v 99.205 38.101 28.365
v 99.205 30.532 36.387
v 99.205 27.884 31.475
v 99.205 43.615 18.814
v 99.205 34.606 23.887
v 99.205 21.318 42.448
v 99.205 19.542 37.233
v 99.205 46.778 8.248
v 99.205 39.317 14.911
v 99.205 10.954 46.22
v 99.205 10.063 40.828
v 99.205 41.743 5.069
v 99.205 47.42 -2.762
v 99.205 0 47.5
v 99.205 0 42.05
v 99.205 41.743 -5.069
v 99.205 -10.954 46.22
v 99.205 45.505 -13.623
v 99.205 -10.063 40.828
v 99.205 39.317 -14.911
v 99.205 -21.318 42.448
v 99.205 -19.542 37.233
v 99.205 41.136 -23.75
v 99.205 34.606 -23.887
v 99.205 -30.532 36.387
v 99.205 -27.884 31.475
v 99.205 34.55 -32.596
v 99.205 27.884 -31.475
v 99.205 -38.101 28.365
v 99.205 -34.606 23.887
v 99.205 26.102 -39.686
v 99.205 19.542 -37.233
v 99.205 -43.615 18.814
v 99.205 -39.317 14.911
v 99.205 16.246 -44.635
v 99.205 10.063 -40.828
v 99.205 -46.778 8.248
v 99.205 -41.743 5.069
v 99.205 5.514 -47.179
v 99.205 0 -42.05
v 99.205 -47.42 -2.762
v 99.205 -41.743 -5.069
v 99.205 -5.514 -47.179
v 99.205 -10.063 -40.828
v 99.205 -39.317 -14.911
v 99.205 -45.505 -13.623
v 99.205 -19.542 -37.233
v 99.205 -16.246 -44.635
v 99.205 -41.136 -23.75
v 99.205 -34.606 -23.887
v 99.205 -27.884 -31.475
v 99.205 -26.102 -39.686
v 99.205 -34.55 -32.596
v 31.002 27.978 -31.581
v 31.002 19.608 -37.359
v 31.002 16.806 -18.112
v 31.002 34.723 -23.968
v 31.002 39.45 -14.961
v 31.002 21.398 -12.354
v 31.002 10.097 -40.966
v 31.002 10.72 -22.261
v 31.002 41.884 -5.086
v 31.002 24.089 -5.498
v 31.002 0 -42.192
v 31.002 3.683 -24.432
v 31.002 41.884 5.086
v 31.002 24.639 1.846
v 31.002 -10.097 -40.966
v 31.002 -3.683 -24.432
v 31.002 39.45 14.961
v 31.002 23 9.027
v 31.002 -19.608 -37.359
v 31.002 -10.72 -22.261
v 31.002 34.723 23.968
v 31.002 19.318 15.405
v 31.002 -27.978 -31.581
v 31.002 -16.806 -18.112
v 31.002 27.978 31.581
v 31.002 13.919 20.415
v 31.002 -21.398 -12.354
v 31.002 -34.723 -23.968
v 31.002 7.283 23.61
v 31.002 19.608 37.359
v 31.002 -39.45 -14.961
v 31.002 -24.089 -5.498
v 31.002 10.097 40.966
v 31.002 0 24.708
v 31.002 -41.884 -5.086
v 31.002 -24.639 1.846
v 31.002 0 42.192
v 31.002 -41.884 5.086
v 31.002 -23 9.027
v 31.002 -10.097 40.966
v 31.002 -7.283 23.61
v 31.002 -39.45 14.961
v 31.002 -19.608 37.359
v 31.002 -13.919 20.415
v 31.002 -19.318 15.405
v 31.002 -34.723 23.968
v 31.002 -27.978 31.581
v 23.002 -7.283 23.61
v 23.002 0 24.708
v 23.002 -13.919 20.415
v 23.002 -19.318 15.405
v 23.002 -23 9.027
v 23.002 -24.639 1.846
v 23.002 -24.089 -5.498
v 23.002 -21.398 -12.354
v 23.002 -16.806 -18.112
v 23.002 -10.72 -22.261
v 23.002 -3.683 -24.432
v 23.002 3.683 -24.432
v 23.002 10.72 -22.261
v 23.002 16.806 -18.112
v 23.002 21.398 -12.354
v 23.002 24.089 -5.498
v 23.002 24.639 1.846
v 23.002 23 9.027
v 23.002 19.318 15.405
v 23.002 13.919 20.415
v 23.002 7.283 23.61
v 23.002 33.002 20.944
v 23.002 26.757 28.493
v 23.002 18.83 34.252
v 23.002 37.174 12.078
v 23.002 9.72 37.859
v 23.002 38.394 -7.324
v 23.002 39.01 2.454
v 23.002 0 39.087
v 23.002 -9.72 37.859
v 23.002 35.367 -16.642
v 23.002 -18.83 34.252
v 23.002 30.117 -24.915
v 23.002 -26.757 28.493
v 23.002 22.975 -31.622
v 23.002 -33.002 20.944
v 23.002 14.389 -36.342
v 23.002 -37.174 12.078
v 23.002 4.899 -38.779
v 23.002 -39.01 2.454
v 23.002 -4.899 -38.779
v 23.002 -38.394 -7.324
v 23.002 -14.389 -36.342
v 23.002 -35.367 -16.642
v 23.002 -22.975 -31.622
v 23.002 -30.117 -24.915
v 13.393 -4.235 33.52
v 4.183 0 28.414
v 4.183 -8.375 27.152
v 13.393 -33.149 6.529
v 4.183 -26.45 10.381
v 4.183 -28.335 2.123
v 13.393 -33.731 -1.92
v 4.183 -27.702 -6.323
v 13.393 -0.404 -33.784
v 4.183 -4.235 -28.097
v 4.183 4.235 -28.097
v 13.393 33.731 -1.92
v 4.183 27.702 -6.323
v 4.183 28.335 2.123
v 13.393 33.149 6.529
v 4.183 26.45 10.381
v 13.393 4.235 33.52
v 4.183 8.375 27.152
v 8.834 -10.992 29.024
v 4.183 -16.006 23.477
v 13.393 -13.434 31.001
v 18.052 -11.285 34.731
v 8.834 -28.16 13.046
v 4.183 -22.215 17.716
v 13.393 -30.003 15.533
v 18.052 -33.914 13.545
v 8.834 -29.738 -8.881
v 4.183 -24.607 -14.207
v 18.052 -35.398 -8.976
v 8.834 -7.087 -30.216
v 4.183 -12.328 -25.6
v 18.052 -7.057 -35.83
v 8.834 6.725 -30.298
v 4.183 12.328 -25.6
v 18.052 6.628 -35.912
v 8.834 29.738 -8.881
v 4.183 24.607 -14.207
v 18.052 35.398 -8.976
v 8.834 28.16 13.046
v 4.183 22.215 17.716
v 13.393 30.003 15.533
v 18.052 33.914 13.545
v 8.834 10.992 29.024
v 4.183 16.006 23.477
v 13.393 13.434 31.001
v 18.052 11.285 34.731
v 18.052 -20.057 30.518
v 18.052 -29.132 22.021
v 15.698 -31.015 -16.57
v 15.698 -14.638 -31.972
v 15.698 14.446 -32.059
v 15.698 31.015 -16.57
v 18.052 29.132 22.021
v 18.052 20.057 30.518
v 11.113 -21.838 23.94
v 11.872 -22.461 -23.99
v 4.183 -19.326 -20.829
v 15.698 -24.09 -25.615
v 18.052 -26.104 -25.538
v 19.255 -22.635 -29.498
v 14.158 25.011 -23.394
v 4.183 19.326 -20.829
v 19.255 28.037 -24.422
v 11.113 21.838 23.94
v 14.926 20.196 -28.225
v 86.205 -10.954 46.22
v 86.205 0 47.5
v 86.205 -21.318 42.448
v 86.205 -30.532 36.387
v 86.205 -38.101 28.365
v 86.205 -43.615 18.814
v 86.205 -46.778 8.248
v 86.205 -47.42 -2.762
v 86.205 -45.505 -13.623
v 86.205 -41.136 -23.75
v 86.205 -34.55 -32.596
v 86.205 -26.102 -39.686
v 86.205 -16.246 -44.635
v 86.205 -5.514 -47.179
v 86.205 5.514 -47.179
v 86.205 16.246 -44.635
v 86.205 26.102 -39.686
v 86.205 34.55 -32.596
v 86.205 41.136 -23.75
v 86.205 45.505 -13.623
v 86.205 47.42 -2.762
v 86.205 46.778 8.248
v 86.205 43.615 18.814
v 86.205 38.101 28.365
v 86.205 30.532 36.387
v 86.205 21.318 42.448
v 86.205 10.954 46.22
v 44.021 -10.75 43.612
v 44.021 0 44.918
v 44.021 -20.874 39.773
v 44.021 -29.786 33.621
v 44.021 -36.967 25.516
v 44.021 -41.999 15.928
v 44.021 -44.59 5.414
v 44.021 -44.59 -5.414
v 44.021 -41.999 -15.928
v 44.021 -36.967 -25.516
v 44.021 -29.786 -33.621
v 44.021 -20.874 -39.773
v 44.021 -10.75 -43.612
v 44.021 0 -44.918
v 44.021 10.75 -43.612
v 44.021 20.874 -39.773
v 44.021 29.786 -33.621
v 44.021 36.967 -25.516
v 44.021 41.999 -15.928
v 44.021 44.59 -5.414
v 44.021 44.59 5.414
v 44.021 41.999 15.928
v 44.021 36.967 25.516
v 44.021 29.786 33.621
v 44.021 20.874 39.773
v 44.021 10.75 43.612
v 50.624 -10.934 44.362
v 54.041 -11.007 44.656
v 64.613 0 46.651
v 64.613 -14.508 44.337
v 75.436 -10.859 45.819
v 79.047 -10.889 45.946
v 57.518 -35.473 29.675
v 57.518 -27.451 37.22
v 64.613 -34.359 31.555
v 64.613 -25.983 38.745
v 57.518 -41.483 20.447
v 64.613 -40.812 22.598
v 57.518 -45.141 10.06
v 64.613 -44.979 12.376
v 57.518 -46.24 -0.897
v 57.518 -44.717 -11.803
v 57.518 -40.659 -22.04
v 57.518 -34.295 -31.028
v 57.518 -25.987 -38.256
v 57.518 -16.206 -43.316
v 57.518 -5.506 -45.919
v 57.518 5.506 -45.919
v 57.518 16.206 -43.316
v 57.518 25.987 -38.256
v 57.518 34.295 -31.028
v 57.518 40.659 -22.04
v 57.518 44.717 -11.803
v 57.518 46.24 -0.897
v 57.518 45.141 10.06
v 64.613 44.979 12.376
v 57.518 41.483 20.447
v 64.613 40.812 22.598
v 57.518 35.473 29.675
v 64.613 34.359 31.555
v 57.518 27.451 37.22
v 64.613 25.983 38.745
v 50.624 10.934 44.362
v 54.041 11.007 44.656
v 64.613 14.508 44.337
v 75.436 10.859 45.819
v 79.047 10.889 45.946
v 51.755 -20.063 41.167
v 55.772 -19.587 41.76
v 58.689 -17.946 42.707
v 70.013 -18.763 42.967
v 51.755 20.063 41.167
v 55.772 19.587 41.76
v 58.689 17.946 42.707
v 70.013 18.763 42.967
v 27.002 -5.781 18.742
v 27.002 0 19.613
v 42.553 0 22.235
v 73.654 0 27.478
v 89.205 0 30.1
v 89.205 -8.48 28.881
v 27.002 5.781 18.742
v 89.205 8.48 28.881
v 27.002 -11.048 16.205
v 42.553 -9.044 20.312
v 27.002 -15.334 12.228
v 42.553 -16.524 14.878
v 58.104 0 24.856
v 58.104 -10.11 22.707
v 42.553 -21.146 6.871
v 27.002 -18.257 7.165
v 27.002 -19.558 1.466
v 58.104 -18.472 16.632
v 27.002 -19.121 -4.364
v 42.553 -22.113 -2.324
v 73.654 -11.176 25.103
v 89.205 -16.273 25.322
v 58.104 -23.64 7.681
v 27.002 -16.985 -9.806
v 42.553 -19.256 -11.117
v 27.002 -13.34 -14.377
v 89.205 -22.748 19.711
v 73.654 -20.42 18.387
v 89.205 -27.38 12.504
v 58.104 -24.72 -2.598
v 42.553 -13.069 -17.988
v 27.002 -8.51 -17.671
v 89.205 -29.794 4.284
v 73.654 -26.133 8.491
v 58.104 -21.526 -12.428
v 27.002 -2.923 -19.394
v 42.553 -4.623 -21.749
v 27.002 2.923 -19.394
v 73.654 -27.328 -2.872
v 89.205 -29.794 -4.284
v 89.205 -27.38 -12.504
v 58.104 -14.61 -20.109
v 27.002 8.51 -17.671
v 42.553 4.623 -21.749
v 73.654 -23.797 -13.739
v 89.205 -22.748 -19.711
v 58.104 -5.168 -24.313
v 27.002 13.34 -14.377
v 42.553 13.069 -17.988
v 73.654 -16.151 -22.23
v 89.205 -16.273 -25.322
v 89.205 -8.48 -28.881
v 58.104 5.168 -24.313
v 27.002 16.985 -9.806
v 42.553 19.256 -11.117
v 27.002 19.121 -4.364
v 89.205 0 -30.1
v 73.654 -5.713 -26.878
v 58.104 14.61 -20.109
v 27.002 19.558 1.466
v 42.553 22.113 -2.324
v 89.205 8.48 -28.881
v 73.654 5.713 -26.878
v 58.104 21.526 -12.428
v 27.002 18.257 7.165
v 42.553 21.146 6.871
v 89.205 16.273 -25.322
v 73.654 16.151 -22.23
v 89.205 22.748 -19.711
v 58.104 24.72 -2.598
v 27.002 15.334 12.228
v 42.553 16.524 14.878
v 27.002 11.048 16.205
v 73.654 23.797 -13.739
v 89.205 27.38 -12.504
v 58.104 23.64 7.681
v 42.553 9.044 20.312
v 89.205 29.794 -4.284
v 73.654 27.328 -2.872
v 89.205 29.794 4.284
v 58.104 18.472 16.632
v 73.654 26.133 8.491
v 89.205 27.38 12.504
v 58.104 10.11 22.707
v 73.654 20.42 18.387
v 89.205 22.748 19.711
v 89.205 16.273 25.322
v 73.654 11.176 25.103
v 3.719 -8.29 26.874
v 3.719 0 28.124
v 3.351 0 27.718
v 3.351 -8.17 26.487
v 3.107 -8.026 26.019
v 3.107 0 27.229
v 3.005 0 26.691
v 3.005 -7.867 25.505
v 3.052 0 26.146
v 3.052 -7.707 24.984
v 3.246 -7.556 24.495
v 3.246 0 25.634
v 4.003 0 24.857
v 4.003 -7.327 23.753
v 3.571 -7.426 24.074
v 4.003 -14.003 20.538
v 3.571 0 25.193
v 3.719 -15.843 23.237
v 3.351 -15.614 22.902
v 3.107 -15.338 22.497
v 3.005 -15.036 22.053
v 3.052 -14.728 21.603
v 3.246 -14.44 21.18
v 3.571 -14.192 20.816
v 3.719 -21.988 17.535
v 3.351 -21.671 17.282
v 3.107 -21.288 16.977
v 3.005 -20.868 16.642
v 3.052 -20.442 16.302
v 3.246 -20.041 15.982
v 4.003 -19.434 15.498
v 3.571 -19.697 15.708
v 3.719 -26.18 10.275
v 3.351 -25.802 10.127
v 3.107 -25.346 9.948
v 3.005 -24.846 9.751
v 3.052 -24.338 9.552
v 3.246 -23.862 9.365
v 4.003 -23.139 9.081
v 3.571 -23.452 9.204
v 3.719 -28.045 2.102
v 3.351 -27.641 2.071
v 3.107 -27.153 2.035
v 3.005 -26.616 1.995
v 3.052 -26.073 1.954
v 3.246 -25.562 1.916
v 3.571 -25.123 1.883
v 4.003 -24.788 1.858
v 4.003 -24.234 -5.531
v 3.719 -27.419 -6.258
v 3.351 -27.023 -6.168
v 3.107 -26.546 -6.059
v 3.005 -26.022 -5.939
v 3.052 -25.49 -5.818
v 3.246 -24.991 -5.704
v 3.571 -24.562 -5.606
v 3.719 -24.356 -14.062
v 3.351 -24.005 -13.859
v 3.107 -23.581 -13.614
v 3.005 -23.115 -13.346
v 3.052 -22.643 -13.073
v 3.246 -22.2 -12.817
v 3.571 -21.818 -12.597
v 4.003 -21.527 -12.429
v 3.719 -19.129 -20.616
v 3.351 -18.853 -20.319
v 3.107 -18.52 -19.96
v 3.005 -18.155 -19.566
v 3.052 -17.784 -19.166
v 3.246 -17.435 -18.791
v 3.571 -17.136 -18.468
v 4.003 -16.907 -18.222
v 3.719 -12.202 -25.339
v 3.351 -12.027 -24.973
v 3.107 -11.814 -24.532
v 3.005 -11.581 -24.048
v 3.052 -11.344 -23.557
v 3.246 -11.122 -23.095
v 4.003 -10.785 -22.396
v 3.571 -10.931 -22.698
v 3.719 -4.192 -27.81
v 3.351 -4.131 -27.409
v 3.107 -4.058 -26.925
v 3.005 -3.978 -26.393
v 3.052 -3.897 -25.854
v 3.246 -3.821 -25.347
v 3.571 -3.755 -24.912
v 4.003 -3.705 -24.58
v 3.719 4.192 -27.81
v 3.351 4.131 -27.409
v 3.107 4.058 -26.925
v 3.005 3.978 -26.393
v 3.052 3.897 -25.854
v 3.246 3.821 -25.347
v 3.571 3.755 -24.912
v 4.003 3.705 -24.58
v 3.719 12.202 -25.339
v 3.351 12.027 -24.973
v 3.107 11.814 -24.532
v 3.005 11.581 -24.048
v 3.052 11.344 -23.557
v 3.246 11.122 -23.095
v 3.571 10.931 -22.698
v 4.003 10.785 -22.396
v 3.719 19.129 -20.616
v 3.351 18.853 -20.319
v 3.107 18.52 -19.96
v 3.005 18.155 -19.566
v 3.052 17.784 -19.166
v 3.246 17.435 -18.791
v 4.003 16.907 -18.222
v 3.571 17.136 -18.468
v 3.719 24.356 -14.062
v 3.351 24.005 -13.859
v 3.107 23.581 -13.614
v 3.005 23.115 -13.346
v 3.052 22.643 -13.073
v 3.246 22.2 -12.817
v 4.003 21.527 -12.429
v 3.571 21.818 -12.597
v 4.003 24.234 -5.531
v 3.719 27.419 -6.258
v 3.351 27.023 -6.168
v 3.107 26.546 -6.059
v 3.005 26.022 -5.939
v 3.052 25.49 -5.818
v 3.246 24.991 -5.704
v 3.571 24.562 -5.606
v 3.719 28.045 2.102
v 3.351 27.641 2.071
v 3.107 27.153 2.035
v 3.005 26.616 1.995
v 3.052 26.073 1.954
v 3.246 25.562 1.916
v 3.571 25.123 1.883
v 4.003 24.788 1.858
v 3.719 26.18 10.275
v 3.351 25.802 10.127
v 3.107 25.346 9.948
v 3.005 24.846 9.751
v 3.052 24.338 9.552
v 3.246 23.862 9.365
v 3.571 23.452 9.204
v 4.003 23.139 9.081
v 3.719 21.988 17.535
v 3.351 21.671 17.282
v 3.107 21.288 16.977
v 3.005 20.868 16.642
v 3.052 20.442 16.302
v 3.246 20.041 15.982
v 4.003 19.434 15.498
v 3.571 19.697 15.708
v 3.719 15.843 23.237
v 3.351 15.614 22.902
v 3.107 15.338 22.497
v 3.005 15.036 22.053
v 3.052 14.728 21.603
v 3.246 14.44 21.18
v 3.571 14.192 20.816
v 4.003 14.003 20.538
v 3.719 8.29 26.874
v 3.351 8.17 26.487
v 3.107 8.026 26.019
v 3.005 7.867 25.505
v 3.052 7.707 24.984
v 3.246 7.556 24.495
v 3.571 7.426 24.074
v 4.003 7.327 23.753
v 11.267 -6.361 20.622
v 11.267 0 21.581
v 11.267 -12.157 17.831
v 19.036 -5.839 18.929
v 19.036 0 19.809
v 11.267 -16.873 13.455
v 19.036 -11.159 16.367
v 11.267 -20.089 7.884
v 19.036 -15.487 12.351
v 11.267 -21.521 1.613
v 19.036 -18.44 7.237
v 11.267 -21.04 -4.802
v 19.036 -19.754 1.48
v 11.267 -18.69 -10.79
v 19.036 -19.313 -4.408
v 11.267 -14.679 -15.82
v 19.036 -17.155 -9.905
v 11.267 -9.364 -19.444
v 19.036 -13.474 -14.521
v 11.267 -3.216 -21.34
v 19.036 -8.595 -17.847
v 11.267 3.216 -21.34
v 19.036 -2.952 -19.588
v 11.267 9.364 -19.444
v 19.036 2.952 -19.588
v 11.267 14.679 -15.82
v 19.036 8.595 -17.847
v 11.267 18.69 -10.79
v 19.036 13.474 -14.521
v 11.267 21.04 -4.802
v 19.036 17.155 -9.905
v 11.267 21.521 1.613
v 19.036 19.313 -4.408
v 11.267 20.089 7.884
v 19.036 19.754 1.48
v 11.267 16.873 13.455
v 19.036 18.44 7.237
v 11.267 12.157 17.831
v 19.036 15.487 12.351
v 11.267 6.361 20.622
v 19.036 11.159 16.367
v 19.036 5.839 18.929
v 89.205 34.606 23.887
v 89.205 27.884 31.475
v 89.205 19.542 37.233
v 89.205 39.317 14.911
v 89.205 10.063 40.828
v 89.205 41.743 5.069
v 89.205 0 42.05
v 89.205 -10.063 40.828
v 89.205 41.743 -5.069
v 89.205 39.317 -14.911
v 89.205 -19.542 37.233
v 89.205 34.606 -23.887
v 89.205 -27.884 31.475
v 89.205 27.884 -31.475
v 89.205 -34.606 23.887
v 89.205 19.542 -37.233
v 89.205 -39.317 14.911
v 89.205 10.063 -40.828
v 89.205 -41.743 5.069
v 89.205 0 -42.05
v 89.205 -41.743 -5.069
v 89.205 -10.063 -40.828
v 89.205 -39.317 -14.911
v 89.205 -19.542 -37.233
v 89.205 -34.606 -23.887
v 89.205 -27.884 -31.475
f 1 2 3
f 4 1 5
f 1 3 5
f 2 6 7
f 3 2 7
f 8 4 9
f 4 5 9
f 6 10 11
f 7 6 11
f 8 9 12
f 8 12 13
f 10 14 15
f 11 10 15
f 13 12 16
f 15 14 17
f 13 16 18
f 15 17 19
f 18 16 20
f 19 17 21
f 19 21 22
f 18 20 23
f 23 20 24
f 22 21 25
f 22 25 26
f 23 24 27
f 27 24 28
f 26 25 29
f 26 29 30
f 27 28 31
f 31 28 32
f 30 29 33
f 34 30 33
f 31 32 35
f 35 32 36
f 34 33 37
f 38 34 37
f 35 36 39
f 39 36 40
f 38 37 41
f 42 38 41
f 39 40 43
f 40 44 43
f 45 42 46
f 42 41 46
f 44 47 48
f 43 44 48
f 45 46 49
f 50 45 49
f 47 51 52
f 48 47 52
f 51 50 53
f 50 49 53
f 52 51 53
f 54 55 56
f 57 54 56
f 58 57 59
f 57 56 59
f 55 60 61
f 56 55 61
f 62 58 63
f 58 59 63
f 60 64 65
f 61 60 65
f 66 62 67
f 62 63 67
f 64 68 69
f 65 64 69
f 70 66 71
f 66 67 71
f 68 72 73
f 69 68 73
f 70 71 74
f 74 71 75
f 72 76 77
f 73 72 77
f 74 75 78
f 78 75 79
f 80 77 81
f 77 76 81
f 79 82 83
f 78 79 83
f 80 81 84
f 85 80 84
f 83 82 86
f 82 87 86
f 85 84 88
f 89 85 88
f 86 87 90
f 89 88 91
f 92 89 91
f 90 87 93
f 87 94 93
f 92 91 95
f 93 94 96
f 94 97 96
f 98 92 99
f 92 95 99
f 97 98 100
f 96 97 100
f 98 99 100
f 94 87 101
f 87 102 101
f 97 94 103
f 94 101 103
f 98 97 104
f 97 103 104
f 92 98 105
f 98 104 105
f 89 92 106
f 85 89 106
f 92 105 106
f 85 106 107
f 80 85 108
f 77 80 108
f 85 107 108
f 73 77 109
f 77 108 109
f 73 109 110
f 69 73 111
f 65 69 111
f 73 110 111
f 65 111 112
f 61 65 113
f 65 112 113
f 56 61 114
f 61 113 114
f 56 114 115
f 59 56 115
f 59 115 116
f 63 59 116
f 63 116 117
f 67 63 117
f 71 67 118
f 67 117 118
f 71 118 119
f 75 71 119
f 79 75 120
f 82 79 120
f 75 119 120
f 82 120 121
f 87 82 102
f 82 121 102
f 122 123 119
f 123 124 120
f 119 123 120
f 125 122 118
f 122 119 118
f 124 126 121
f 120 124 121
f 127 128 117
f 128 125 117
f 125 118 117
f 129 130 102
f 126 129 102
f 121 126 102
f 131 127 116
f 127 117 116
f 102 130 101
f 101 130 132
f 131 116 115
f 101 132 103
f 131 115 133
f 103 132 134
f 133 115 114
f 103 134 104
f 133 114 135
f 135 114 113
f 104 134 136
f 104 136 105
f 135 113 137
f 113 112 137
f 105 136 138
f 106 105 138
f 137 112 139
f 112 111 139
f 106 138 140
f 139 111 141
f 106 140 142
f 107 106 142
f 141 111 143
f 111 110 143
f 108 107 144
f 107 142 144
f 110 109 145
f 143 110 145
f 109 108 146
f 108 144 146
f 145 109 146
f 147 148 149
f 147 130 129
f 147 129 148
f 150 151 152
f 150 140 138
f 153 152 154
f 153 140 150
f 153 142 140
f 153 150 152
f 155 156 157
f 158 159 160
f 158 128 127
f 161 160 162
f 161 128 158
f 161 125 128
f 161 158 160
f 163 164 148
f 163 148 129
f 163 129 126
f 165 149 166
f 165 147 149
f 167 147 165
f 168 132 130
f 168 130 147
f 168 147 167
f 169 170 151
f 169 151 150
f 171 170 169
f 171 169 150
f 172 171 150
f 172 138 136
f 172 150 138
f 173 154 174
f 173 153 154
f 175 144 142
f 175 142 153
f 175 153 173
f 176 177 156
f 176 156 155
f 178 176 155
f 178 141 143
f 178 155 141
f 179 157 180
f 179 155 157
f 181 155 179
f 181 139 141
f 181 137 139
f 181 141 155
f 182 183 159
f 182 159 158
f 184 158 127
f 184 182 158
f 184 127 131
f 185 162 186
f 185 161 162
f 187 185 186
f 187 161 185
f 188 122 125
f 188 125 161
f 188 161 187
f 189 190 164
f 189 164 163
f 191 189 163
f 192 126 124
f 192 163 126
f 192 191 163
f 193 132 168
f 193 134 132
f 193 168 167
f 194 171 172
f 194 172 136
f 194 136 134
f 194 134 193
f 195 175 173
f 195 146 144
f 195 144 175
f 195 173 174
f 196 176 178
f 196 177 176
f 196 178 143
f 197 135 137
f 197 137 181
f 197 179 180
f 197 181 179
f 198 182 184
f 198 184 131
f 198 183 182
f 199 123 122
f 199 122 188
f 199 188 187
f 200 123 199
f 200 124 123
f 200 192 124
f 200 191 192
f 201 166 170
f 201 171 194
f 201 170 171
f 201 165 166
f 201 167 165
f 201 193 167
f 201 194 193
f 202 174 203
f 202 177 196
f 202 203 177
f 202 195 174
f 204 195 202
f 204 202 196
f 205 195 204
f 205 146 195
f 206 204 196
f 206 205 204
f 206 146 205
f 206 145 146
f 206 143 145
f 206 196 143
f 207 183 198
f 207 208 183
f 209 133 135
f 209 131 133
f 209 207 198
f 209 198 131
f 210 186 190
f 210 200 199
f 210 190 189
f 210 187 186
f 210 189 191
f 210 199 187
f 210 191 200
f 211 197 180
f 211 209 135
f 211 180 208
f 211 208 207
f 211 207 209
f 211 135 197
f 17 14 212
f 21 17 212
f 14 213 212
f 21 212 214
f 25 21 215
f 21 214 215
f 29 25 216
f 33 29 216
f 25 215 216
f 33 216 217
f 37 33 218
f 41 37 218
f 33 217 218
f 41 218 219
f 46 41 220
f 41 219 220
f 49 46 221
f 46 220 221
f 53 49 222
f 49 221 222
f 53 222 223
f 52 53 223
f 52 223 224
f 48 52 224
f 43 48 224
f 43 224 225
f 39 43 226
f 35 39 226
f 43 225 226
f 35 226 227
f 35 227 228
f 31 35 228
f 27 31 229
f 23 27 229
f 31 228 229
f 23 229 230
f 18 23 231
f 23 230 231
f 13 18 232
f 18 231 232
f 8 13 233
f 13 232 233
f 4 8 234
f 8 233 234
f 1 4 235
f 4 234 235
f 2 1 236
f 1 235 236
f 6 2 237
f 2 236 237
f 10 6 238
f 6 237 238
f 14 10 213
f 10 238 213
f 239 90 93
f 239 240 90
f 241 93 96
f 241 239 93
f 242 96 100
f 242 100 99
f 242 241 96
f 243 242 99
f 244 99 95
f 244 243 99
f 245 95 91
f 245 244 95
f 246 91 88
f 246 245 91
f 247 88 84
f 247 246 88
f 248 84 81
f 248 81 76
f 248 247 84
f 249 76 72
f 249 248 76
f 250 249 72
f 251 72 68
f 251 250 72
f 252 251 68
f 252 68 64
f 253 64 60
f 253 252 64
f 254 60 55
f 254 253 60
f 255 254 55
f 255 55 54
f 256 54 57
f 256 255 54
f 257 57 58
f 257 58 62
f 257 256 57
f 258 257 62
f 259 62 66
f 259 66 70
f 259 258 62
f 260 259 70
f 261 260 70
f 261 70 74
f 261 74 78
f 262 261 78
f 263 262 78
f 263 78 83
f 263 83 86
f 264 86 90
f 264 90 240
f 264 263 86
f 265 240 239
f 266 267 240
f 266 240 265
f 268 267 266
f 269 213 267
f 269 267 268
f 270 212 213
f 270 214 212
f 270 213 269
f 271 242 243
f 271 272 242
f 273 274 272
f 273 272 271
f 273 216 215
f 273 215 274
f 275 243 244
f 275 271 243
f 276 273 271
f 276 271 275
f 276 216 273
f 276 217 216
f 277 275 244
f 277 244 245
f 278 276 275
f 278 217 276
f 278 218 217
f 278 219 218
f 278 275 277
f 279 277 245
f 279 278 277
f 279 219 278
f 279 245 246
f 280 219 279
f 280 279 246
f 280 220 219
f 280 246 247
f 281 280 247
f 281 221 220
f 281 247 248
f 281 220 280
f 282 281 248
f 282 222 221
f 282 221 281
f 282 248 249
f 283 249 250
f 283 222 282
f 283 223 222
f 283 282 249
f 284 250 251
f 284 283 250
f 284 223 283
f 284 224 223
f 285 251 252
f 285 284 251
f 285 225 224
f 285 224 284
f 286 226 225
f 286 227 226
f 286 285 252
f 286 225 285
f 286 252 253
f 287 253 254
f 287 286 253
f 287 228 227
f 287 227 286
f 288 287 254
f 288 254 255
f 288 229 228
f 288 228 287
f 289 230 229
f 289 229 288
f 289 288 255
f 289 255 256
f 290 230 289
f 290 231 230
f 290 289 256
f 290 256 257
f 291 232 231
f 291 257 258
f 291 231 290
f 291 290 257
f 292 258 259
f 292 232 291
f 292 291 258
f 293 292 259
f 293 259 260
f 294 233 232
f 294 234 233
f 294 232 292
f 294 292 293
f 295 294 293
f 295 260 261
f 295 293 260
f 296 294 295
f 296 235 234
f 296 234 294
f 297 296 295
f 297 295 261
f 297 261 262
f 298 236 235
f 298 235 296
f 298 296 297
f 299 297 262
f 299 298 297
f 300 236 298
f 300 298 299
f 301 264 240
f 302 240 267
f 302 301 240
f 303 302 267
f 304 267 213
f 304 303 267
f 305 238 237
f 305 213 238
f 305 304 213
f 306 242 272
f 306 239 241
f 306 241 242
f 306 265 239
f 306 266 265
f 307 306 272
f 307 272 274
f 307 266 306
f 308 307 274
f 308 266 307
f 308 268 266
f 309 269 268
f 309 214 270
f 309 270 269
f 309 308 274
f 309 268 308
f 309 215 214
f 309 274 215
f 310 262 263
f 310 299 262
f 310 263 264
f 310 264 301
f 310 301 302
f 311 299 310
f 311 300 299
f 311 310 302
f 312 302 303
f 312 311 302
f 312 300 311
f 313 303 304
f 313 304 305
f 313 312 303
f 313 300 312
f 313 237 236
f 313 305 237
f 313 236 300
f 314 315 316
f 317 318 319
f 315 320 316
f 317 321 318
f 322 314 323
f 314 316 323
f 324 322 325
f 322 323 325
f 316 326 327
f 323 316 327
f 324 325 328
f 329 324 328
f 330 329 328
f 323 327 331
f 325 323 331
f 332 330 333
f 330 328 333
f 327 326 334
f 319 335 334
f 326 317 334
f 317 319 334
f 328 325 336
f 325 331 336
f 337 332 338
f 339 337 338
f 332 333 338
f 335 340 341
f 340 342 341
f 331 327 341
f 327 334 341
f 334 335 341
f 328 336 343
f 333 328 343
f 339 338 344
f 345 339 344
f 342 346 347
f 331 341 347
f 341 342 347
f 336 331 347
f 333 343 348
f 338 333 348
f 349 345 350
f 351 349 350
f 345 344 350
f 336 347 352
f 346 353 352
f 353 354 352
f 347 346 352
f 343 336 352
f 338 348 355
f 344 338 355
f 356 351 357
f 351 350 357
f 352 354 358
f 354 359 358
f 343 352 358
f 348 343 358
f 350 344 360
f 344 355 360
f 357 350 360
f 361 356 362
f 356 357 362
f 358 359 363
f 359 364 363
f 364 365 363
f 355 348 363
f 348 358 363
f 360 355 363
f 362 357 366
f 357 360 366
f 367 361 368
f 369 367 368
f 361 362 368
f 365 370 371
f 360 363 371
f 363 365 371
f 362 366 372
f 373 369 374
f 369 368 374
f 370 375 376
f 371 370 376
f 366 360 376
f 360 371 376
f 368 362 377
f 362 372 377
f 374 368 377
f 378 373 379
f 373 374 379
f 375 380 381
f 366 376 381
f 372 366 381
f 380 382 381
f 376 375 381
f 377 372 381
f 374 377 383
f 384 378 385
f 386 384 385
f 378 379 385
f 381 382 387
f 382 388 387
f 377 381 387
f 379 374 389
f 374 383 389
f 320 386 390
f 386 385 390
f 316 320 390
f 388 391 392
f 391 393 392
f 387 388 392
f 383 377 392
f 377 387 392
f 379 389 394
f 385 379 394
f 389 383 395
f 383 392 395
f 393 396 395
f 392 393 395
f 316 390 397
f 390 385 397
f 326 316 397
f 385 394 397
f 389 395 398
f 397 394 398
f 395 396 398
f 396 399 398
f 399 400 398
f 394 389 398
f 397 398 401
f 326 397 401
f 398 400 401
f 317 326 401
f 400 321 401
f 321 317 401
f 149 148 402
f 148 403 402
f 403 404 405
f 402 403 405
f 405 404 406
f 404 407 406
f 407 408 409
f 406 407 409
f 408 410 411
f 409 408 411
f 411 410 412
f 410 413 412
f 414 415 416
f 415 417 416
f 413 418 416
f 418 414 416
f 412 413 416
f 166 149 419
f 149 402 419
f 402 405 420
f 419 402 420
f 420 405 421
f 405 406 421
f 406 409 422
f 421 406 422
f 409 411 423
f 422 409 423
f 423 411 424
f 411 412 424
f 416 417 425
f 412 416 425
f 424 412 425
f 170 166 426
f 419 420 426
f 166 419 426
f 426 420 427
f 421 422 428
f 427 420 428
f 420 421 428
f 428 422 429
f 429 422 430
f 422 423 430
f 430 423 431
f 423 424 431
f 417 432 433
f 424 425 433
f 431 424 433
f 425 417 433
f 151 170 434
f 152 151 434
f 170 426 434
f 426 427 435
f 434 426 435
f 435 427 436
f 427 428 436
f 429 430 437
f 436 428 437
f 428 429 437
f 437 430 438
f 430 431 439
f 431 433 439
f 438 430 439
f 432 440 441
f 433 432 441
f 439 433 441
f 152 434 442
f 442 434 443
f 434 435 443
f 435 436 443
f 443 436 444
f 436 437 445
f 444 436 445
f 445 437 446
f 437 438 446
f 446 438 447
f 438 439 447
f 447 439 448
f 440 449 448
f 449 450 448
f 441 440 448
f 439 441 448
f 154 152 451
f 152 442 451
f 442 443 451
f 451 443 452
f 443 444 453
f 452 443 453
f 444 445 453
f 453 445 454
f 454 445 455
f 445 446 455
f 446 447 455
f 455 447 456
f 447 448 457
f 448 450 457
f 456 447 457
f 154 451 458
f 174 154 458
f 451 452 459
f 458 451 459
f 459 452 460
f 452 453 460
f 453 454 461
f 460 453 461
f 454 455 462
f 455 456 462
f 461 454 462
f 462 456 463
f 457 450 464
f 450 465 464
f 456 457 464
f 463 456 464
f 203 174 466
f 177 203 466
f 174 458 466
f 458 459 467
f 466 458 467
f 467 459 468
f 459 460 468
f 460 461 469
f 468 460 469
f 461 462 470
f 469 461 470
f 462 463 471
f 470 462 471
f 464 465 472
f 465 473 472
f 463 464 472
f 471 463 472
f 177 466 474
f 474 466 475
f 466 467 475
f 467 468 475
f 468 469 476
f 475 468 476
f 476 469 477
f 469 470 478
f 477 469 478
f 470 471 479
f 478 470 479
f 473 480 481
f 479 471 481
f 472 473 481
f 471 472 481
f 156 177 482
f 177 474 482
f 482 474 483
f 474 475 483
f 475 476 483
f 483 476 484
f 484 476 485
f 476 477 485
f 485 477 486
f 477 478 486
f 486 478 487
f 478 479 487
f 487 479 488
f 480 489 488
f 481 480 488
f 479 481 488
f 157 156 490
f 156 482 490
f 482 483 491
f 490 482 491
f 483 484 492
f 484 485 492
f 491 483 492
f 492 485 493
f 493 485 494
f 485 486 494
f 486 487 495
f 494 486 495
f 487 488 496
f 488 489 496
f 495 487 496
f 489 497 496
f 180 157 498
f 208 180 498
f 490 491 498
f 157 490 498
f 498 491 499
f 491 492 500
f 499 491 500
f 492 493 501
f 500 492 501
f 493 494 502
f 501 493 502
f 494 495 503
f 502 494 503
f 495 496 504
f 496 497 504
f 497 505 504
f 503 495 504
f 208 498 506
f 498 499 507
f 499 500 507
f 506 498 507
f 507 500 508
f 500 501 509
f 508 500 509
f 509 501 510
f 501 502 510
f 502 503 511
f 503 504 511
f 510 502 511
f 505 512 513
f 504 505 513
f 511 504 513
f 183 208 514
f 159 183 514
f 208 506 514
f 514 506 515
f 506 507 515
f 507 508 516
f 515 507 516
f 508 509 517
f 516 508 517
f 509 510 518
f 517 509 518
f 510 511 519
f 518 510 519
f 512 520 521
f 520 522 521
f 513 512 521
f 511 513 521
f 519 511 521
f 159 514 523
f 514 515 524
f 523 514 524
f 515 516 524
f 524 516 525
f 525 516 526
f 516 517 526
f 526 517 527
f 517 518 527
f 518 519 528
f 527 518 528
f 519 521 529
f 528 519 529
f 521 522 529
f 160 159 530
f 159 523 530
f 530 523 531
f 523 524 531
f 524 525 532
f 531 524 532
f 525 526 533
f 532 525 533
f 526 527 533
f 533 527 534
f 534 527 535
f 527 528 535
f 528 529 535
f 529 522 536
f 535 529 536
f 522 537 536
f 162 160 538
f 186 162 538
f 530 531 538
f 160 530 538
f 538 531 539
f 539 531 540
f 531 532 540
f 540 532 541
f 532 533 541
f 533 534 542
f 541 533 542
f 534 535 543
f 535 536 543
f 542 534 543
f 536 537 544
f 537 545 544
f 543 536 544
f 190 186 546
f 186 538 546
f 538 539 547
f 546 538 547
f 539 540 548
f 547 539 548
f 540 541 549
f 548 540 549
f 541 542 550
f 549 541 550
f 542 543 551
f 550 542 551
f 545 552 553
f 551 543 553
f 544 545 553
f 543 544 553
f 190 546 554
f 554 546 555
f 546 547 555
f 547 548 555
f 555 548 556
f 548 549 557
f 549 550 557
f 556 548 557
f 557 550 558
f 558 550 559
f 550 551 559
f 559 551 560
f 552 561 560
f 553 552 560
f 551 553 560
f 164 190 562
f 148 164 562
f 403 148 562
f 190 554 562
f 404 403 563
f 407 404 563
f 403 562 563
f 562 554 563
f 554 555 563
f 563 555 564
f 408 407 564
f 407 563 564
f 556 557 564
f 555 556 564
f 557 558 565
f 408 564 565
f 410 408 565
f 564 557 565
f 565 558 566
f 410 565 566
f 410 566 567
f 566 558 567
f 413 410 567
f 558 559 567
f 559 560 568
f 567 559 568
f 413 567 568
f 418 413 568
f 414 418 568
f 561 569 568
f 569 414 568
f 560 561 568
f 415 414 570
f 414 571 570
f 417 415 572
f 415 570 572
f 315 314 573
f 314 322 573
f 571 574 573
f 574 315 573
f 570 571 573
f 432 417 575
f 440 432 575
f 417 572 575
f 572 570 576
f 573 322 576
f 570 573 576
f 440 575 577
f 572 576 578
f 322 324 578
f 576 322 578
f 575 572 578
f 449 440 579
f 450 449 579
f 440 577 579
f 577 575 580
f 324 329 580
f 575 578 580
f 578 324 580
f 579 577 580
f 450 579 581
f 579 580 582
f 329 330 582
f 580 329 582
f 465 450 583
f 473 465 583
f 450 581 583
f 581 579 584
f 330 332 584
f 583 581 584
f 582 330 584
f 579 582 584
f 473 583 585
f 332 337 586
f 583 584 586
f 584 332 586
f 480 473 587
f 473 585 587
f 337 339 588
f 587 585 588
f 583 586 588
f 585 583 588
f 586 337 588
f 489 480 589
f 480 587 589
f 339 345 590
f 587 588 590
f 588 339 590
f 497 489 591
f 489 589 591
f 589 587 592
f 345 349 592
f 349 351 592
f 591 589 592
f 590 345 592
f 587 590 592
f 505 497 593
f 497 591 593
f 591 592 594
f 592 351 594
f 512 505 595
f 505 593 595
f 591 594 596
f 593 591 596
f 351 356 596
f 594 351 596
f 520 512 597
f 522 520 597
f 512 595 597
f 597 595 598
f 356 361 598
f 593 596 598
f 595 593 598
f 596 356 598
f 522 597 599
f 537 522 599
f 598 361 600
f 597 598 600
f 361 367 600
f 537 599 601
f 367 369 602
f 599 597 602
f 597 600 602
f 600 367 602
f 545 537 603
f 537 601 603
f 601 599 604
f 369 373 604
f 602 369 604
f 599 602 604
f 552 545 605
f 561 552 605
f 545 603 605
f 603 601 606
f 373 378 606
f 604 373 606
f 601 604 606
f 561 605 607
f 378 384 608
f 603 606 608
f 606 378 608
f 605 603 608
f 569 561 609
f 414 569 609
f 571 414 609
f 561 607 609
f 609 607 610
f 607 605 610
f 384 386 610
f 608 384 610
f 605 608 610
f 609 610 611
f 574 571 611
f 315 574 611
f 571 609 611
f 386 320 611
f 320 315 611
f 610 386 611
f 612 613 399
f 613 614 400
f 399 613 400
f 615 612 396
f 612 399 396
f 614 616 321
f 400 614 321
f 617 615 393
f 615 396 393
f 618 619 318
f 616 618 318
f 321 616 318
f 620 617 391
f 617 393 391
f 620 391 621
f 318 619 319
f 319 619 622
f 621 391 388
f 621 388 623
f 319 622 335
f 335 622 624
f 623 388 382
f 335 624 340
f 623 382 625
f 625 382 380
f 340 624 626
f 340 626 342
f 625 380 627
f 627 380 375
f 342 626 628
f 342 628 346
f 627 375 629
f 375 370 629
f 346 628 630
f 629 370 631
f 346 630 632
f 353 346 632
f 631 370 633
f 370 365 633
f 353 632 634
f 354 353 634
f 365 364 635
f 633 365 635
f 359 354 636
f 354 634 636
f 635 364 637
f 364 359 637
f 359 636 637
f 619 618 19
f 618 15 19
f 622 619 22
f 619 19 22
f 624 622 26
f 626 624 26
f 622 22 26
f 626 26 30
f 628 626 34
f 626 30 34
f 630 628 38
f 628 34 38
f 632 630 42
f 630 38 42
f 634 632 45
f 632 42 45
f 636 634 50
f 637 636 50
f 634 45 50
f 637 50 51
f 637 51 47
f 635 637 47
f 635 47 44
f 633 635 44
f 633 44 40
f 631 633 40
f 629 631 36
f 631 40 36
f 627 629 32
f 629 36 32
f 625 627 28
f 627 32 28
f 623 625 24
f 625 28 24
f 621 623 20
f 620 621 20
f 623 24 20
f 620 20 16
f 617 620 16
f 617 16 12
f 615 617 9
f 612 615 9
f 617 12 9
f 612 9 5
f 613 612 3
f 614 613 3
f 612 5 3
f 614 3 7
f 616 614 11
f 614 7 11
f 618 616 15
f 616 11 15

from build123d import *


with BuildPart() as f1:
    # F0 (on Front) → F1 (revolve)
    with BuildSketch(Plane.XZ):
        with BuildLine():
            ThreePointArc((4.183166, 28.4140925651), (3.005042448, 26.6910164945), (4.0025999075, 24.8574829214))
            ThreePointArc((4.0025999075, 24.8574829214), (15.1071112107, 20.5010701559), (27.0024699122, 19.6128444932))
            Line((27.0024699122, 19.6128444932), (89.2047976328, 30.1))
            Line((89.2047976328, 30.1), (89.2047976328, 42.05))
            Line((89.2047976328, 42.05), (99.2047976328, 42.05))
            Line((99.2047976328, 42.05), (99.2047976328, 47.5))
            Line((99.2047976328, 47.5), (86.2047976328, 47.5))
            add(Edge.make_bspline(
                [(31.0024699122, 42.1920199909), (45.6814790288, 46.6541446853), (66.8331744446, 46.6543637211), (86.2047976328, 47.5)],
                knots=[0.4274551338, 0.4274551338, 0.4274551338, 0.4274551338, 1, 1, 1, 1], degree=3))
            Line((31.0024699122, 42.1920199909), (31.0024699122, 24.708148092))
            Line((31.0024699122, 24.708148092), (23.0024699122, 24.708148092))
            Line((23.0024699122, 24.708148092), (23.0024699122, 39.0867841668))
            add(Edge.make_bspline(
                [(4.183166, 28.4140925651), (10.5303895975, 31.7579291187), (16.1233335949, 35.8378131978), (23.0024699122, 39.0867841668)],
                knots=[0, 0, 0, 0, 0.3145414236, 0.3145414236, 0.3145414236, 0.3145414236], degree=3))
        make_face()
    revolve(axis=Axis((39.1335301101, 0, 0), (1, 0, 0)))


solid = f1.part
